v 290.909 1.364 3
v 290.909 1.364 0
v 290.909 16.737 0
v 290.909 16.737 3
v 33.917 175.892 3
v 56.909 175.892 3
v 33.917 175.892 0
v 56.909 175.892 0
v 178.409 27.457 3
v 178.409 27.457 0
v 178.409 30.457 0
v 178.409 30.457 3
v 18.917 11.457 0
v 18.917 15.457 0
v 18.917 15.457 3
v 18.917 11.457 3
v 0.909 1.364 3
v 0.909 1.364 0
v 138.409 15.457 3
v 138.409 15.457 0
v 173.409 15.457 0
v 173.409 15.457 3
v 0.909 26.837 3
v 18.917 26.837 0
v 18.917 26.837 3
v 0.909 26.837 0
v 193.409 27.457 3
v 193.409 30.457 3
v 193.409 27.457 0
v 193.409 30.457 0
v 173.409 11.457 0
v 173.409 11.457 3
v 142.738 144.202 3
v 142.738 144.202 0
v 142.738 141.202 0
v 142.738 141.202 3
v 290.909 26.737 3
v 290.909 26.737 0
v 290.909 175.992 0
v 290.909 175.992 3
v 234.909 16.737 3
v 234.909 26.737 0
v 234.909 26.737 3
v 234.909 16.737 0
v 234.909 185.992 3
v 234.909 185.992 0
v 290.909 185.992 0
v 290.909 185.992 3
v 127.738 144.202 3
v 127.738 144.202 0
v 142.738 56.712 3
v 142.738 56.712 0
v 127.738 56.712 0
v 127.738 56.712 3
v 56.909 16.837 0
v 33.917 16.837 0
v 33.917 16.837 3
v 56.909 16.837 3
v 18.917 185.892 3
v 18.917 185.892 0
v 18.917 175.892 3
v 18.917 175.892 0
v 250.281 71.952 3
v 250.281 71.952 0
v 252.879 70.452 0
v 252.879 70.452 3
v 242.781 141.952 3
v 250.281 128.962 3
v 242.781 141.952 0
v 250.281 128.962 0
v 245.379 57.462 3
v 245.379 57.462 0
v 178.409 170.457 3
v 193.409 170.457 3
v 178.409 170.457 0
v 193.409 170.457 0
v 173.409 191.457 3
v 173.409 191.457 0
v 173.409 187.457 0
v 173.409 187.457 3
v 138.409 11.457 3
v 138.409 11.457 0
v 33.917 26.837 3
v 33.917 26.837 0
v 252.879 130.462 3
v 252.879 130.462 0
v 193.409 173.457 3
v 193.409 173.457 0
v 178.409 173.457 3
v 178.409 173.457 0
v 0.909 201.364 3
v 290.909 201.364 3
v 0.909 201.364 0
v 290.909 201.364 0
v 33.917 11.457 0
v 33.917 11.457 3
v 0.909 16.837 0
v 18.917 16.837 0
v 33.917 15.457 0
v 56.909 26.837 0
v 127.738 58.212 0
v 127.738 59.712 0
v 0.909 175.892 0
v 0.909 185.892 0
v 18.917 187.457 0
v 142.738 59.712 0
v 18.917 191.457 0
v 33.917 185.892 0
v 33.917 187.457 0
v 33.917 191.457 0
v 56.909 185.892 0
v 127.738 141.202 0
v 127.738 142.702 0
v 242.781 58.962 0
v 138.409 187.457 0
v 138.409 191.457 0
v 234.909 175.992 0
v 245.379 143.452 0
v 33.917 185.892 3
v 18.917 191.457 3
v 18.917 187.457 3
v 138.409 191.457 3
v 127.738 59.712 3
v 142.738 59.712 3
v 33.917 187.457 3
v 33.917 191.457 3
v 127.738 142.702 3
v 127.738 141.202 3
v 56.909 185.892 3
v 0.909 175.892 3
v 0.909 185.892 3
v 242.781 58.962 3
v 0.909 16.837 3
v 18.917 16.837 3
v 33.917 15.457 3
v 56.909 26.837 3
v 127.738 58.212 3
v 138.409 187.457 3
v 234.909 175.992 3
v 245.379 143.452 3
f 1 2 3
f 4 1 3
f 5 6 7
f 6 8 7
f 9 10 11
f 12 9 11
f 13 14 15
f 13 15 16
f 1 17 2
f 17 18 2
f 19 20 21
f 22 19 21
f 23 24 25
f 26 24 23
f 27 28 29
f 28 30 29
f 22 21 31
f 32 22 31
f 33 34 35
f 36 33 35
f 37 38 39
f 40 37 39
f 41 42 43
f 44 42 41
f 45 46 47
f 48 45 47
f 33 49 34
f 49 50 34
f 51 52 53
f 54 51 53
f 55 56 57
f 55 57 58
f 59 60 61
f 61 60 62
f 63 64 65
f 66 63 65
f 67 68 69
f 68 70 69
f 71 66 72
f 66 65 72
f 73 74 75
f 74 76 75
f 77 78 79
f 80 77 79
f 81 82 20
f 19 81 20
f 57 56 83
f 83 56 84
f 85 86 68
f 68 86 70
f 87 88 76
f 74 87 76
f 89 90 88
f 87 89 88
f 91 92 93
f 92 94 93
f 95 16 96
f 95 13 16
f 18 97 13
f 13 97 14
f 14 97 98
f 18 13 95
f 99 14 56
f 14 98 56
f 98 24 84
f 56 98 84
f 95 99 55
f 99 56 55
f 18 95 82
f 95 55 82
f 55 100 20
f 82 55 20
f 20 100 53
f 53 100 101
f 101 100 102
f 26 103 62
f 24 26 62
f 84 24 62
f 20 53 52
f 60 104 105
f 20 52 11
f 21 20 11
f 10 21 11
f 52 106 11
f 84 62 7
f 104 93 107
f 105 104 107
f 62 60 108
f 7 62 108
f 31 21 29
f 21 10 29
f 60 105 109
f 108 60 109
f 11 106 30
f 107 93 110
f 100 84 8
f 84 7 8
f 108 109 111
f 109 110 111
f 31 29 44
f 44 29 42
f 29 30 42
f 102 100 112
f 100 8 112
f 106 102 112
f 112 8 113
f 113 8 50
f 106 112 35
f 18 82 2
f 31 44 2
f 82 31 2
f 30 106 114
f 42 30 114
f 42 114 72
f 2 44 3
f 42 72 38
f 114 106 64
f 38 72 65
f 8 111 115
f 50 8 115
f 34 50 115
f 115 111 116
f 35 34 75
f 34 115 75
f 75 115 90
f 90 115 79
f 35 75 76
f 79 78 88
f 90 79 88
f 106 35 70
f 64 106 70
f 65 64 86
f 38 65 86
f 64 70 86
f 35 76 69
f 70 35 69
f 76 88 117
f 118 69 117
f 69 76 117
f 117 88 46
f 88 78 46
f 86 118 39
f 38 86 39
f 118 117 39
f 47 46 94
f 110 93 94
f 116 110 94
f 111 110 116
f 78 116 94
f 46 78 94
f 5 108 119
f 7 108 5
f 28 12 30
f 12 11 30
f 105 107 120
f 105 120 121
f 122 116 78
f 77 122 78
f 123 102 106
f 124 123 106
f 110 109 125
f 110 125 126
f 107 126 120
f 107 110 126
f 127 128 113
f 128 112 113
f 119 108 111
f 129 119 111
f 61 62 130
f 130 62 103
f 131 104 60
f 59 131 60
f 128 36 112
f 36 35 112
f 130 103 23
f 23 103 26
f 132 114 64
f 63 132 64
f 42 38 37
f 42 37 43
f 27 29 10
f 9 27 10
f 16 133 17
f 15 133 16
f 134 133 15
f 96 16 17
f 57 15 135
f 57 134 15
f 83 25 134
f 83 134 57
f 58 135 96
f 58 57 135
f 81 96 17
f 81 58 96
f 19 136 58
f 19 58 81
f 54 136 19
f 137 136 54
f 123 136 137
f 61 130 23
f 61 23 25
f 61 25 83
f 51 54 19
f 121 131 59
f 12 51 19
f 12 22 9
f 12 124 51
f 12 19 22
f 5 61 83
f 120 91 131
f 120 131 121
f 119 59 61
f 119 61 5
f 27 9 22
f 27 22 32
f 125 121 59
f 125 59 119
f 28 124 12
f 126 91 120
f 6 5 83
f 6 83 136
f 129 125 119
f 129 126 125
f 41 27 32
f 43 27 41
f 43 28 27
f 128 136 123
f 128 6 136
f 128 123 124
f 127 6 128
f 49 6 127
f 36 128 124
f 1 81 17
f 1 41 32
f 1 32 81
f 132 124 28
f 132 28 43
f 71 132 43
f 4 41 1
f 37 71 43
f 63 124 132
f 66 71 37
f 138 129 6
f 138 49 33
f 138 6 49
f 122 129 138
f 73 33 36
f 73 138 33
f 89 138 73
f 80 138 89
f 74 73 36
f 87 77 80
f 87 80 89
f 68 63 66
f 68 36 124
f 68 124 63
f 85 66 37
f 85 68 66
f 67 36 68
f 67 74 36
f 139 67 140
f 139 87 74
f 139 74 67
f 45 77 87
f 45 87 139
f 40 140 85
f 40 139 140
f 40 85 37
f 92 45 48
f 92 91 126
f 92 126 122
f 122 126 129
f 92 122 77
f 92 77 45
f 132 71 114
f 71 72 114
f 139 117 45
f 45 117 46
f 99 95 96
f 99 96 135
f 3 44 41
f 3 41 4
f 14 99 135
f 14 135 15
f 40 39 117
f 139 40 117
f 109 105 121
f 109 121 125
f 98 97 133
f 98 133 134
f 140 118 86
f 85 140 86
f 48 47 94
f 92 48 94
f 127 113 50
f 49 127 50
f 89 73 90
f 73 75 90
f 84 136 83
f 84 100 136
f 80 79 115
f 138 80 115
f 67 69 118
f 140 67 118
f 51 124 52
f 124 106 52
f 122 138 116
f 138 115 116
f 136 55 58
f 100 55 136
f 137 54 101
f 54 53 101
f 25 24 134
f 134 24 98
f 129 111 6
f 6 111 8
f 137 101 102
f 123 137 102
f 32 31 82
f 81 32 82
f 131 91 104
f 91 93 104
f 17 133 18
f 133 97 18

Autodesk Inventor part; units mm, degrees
ref_plane "YZ Plane" through (0, 0, 0) normal (1, 0, 0) x (0, 1, 0)
ref_plane "XZ Plane" through (0, 0, 0) normal (0, 1, 0) x (-1, 0, 0)
ref_plane "XY Plane" through (0, 0, 0) normal (0, 0, 1) x (1, 0, 0)
sketch "Sketch1" plane through (0, 0, 0) normal (0, 0, 1) x (1, 0, 0)
  line L0 (0.909, 16.8369) -> (0.909, 1.3644)
  line L1 (0.909, 1.3644) -> (290.909, 1.3644)
  line L2 (0.909, 175.8919) -> (0.909, 26.8369)
  line L3 (290.909, 185.9921) -> (290.909, 201.3644)
  line L4 (290.909, 201.3644) -> (0.909, 201.3644)
  line L5 (0.909, 201.3644) -> (0.909, 185.8919)
  line L6 (290.909, 26.7367) -> (290.909, 175.9921)
  line L7 (290.909, 1.3644) -> (290.909, 16.7367)
  line L8 (290.909, 26.7367) -> (290.909, 175.9921)
  line L9 (0.909, 16.8369) -> (0.909, 1.3644)
  line L10 (0.909, 1.3644) -> (290.909, 1.3644)
  line L11 (290.909, 1.3644) -> (290.909, 16.7367)
  line L12 (0.909, 175.8919) -> (0.909, 26.8369)
  line L13 (138.409, 187.457) -> (138.409, 191.457)
  line L14 (138.409, 191.457) -> (173.409, 191.457)
  line L15 (173.409, 191.457) -> (173.409, 187.457)
  line L16 (173.409, 187.457) -> (138.409, 187.457)
  line L17 (173.409, 11.457) -> (138.409, 11.457)
  line L18 (138.409, 11.457) -> (138.409, 15.457)
  line L19 (138.409, 15.457) -> (173.409, 15.457)
  line L20 (173.409, 15.457) -> (173.409, 11.457)
  line L21 (290.909, 175.9921) -> (234.909, 175.9921)
  line L22 (234.909, 175.9921) -> (234.909, 185.9921)
  line L23 (234.909, 185.9921) -> (290.909, 185.9921)
  line L24 (56.909, 185.8919) -> (56.909, 175.8919)
  line L25 (178.409, 173.457) -> (193.409, 173.457)
  line L26 (193.409, 173.457) -> (193.409, 170.457)
  line L27 (193.409, 170.457) -> (178.409, 170.457)
  line L28 (178.409, 170.457) -> (178.409, 173.457)
  line L29 (126.4391, 143.4522) -> (129.0372, 141.9522)
  line L30 (252.8788, 70.4522) -> (245.3788, 57.4618)
  line L31 (245.3788, 57.4618) -> (242.7807, 58.9618)
  line L32 (242.7807, 58.9618) -> (250.2807, 71.9522)
  line L33 (250.2807, 71.9522) -> (252.8788, 70.4522)
  line L34 (129.0372, 58.9618) -> (126.4391, 57.4618)
  line L35 (242.7807, 141.9522) -> (245.3788, 143.4522)
  line L36 (245.3788, 143.4522) -> (252.8788, 130.4618)
  line L37 (252.8788, 130.4618) -> (250.2807, 128.9618)
  line L38 (250.2807, 128.9618) -> (242.7807, 141.9522)
  line L39 (193.409, 27.457) -> (178.409, 27.457)
  line L40 (178.409, 27.457) -> (178.409, 30.457)
  line L41 (178.409, 30.457) -> (193.409, 30.457)
  line L42 (193.409, 30.457) -> (193.409, 27.457)
  line L43 (290.909, 26.7367) -> (234.909, 26.7367)
  line L44 (234.909, 26.7367) -> (234.909, 16.7367)
  line L45 (234.909, 16.7367) -> (290.909, 16.7367)
  line L46 (56.909, 16.8369) -> (56.909, 26.8369)
  line L47 (18.917, 187.457) -> (33.917, 187.457)
  line L48 (33.917, 187.457) -> (33.917, 191.457)
  line L49 (33.917, 191.457) -> (18.917, 191.457)
  line L50 (18.917, 191.457) -> (18.917, 187.457)
  line L51 (33.917, 11.457) -> (33.917, 15.457)
  line L52 (33.917, 15.457) -> (18.917, 15.457)
  line L53 (18.917, 15.457) -> (18.917, 11.457)
  line L54 (18.917, 11.457) -> (33.917, 11.457)
  line L55 (18.917, 185.8919) -> (18.917, 175.8919)
  line L56 (33.917, 185.8919) -> (33.917, 175.8919)
  line L57 (0.909, 185.8919) -> (18.917, 185.8919)
  line L58 (33.917, 185.8919) -> (56.909, 185.8919)
  line L59 (56.909, 175.8919) -> (33.917, 175.8919)
  line L60 (18.917, 175.8919) -> (0.909, 175.8919)
  line L61 (18.917, 26.8369) -> (18.917, 16.8369)
  line L62 (33.917, 16.8369) -> (33.917, 26.8369)
  line L63 (56.909, 26.8369) -> (33.917, 26.8369)
  line L64 (18.917, 26.8369) -> (0.909, 26.8369)
  line L65 (0.909, 16.8369) -> (18.917, 16.8369)
  line L66 (33.917, 16.8369) -> (56.909, 16.8369)
  line L67 (127.7381, 142.7022) -> (127.7381, 144.2022)
  line L68 (127.7381, 141.2022) -> (127.7381, 142.7022)
  line L69 (127.7381, 58.2118) -> (127.7381, 59.7118)
  line L70 (127.7381, 56.7118) -> (127.7381, 58.2118)
  line L71 (127.7381, 144.2022) -> (142.7381, 144.2022)
  line L72 (142.7381, 144.2022) -> (142.7381, 141.2022)
  line L73 (142.7381, 141.2022) -> (127.7381, 141.2022)
  line L74 (127.7381, 141.2022) -> (127.7381, 144.2022)
  line L75 (127.7381, 59.7118) -> (142.7381, 59.7118)
  line L76 (142.7381, 59.7118) -> (142.7381, 56.7118)
  line L77 (142.7381, 56.7118) -> (127.7381, 56.7118)
  line L78 (127.7381, 56.7118) -> (127.7381, 59.7118)
  dimension "d266" = 1.5
  dimension "d274" = 15
  dimension "d275" = 3
  dimension "d276" = 15
  dimension "d277" = 3
extrude "Extrusion3" add sketch "Sketch1" along normal blind 3
properties part number "base_ver2_2"
